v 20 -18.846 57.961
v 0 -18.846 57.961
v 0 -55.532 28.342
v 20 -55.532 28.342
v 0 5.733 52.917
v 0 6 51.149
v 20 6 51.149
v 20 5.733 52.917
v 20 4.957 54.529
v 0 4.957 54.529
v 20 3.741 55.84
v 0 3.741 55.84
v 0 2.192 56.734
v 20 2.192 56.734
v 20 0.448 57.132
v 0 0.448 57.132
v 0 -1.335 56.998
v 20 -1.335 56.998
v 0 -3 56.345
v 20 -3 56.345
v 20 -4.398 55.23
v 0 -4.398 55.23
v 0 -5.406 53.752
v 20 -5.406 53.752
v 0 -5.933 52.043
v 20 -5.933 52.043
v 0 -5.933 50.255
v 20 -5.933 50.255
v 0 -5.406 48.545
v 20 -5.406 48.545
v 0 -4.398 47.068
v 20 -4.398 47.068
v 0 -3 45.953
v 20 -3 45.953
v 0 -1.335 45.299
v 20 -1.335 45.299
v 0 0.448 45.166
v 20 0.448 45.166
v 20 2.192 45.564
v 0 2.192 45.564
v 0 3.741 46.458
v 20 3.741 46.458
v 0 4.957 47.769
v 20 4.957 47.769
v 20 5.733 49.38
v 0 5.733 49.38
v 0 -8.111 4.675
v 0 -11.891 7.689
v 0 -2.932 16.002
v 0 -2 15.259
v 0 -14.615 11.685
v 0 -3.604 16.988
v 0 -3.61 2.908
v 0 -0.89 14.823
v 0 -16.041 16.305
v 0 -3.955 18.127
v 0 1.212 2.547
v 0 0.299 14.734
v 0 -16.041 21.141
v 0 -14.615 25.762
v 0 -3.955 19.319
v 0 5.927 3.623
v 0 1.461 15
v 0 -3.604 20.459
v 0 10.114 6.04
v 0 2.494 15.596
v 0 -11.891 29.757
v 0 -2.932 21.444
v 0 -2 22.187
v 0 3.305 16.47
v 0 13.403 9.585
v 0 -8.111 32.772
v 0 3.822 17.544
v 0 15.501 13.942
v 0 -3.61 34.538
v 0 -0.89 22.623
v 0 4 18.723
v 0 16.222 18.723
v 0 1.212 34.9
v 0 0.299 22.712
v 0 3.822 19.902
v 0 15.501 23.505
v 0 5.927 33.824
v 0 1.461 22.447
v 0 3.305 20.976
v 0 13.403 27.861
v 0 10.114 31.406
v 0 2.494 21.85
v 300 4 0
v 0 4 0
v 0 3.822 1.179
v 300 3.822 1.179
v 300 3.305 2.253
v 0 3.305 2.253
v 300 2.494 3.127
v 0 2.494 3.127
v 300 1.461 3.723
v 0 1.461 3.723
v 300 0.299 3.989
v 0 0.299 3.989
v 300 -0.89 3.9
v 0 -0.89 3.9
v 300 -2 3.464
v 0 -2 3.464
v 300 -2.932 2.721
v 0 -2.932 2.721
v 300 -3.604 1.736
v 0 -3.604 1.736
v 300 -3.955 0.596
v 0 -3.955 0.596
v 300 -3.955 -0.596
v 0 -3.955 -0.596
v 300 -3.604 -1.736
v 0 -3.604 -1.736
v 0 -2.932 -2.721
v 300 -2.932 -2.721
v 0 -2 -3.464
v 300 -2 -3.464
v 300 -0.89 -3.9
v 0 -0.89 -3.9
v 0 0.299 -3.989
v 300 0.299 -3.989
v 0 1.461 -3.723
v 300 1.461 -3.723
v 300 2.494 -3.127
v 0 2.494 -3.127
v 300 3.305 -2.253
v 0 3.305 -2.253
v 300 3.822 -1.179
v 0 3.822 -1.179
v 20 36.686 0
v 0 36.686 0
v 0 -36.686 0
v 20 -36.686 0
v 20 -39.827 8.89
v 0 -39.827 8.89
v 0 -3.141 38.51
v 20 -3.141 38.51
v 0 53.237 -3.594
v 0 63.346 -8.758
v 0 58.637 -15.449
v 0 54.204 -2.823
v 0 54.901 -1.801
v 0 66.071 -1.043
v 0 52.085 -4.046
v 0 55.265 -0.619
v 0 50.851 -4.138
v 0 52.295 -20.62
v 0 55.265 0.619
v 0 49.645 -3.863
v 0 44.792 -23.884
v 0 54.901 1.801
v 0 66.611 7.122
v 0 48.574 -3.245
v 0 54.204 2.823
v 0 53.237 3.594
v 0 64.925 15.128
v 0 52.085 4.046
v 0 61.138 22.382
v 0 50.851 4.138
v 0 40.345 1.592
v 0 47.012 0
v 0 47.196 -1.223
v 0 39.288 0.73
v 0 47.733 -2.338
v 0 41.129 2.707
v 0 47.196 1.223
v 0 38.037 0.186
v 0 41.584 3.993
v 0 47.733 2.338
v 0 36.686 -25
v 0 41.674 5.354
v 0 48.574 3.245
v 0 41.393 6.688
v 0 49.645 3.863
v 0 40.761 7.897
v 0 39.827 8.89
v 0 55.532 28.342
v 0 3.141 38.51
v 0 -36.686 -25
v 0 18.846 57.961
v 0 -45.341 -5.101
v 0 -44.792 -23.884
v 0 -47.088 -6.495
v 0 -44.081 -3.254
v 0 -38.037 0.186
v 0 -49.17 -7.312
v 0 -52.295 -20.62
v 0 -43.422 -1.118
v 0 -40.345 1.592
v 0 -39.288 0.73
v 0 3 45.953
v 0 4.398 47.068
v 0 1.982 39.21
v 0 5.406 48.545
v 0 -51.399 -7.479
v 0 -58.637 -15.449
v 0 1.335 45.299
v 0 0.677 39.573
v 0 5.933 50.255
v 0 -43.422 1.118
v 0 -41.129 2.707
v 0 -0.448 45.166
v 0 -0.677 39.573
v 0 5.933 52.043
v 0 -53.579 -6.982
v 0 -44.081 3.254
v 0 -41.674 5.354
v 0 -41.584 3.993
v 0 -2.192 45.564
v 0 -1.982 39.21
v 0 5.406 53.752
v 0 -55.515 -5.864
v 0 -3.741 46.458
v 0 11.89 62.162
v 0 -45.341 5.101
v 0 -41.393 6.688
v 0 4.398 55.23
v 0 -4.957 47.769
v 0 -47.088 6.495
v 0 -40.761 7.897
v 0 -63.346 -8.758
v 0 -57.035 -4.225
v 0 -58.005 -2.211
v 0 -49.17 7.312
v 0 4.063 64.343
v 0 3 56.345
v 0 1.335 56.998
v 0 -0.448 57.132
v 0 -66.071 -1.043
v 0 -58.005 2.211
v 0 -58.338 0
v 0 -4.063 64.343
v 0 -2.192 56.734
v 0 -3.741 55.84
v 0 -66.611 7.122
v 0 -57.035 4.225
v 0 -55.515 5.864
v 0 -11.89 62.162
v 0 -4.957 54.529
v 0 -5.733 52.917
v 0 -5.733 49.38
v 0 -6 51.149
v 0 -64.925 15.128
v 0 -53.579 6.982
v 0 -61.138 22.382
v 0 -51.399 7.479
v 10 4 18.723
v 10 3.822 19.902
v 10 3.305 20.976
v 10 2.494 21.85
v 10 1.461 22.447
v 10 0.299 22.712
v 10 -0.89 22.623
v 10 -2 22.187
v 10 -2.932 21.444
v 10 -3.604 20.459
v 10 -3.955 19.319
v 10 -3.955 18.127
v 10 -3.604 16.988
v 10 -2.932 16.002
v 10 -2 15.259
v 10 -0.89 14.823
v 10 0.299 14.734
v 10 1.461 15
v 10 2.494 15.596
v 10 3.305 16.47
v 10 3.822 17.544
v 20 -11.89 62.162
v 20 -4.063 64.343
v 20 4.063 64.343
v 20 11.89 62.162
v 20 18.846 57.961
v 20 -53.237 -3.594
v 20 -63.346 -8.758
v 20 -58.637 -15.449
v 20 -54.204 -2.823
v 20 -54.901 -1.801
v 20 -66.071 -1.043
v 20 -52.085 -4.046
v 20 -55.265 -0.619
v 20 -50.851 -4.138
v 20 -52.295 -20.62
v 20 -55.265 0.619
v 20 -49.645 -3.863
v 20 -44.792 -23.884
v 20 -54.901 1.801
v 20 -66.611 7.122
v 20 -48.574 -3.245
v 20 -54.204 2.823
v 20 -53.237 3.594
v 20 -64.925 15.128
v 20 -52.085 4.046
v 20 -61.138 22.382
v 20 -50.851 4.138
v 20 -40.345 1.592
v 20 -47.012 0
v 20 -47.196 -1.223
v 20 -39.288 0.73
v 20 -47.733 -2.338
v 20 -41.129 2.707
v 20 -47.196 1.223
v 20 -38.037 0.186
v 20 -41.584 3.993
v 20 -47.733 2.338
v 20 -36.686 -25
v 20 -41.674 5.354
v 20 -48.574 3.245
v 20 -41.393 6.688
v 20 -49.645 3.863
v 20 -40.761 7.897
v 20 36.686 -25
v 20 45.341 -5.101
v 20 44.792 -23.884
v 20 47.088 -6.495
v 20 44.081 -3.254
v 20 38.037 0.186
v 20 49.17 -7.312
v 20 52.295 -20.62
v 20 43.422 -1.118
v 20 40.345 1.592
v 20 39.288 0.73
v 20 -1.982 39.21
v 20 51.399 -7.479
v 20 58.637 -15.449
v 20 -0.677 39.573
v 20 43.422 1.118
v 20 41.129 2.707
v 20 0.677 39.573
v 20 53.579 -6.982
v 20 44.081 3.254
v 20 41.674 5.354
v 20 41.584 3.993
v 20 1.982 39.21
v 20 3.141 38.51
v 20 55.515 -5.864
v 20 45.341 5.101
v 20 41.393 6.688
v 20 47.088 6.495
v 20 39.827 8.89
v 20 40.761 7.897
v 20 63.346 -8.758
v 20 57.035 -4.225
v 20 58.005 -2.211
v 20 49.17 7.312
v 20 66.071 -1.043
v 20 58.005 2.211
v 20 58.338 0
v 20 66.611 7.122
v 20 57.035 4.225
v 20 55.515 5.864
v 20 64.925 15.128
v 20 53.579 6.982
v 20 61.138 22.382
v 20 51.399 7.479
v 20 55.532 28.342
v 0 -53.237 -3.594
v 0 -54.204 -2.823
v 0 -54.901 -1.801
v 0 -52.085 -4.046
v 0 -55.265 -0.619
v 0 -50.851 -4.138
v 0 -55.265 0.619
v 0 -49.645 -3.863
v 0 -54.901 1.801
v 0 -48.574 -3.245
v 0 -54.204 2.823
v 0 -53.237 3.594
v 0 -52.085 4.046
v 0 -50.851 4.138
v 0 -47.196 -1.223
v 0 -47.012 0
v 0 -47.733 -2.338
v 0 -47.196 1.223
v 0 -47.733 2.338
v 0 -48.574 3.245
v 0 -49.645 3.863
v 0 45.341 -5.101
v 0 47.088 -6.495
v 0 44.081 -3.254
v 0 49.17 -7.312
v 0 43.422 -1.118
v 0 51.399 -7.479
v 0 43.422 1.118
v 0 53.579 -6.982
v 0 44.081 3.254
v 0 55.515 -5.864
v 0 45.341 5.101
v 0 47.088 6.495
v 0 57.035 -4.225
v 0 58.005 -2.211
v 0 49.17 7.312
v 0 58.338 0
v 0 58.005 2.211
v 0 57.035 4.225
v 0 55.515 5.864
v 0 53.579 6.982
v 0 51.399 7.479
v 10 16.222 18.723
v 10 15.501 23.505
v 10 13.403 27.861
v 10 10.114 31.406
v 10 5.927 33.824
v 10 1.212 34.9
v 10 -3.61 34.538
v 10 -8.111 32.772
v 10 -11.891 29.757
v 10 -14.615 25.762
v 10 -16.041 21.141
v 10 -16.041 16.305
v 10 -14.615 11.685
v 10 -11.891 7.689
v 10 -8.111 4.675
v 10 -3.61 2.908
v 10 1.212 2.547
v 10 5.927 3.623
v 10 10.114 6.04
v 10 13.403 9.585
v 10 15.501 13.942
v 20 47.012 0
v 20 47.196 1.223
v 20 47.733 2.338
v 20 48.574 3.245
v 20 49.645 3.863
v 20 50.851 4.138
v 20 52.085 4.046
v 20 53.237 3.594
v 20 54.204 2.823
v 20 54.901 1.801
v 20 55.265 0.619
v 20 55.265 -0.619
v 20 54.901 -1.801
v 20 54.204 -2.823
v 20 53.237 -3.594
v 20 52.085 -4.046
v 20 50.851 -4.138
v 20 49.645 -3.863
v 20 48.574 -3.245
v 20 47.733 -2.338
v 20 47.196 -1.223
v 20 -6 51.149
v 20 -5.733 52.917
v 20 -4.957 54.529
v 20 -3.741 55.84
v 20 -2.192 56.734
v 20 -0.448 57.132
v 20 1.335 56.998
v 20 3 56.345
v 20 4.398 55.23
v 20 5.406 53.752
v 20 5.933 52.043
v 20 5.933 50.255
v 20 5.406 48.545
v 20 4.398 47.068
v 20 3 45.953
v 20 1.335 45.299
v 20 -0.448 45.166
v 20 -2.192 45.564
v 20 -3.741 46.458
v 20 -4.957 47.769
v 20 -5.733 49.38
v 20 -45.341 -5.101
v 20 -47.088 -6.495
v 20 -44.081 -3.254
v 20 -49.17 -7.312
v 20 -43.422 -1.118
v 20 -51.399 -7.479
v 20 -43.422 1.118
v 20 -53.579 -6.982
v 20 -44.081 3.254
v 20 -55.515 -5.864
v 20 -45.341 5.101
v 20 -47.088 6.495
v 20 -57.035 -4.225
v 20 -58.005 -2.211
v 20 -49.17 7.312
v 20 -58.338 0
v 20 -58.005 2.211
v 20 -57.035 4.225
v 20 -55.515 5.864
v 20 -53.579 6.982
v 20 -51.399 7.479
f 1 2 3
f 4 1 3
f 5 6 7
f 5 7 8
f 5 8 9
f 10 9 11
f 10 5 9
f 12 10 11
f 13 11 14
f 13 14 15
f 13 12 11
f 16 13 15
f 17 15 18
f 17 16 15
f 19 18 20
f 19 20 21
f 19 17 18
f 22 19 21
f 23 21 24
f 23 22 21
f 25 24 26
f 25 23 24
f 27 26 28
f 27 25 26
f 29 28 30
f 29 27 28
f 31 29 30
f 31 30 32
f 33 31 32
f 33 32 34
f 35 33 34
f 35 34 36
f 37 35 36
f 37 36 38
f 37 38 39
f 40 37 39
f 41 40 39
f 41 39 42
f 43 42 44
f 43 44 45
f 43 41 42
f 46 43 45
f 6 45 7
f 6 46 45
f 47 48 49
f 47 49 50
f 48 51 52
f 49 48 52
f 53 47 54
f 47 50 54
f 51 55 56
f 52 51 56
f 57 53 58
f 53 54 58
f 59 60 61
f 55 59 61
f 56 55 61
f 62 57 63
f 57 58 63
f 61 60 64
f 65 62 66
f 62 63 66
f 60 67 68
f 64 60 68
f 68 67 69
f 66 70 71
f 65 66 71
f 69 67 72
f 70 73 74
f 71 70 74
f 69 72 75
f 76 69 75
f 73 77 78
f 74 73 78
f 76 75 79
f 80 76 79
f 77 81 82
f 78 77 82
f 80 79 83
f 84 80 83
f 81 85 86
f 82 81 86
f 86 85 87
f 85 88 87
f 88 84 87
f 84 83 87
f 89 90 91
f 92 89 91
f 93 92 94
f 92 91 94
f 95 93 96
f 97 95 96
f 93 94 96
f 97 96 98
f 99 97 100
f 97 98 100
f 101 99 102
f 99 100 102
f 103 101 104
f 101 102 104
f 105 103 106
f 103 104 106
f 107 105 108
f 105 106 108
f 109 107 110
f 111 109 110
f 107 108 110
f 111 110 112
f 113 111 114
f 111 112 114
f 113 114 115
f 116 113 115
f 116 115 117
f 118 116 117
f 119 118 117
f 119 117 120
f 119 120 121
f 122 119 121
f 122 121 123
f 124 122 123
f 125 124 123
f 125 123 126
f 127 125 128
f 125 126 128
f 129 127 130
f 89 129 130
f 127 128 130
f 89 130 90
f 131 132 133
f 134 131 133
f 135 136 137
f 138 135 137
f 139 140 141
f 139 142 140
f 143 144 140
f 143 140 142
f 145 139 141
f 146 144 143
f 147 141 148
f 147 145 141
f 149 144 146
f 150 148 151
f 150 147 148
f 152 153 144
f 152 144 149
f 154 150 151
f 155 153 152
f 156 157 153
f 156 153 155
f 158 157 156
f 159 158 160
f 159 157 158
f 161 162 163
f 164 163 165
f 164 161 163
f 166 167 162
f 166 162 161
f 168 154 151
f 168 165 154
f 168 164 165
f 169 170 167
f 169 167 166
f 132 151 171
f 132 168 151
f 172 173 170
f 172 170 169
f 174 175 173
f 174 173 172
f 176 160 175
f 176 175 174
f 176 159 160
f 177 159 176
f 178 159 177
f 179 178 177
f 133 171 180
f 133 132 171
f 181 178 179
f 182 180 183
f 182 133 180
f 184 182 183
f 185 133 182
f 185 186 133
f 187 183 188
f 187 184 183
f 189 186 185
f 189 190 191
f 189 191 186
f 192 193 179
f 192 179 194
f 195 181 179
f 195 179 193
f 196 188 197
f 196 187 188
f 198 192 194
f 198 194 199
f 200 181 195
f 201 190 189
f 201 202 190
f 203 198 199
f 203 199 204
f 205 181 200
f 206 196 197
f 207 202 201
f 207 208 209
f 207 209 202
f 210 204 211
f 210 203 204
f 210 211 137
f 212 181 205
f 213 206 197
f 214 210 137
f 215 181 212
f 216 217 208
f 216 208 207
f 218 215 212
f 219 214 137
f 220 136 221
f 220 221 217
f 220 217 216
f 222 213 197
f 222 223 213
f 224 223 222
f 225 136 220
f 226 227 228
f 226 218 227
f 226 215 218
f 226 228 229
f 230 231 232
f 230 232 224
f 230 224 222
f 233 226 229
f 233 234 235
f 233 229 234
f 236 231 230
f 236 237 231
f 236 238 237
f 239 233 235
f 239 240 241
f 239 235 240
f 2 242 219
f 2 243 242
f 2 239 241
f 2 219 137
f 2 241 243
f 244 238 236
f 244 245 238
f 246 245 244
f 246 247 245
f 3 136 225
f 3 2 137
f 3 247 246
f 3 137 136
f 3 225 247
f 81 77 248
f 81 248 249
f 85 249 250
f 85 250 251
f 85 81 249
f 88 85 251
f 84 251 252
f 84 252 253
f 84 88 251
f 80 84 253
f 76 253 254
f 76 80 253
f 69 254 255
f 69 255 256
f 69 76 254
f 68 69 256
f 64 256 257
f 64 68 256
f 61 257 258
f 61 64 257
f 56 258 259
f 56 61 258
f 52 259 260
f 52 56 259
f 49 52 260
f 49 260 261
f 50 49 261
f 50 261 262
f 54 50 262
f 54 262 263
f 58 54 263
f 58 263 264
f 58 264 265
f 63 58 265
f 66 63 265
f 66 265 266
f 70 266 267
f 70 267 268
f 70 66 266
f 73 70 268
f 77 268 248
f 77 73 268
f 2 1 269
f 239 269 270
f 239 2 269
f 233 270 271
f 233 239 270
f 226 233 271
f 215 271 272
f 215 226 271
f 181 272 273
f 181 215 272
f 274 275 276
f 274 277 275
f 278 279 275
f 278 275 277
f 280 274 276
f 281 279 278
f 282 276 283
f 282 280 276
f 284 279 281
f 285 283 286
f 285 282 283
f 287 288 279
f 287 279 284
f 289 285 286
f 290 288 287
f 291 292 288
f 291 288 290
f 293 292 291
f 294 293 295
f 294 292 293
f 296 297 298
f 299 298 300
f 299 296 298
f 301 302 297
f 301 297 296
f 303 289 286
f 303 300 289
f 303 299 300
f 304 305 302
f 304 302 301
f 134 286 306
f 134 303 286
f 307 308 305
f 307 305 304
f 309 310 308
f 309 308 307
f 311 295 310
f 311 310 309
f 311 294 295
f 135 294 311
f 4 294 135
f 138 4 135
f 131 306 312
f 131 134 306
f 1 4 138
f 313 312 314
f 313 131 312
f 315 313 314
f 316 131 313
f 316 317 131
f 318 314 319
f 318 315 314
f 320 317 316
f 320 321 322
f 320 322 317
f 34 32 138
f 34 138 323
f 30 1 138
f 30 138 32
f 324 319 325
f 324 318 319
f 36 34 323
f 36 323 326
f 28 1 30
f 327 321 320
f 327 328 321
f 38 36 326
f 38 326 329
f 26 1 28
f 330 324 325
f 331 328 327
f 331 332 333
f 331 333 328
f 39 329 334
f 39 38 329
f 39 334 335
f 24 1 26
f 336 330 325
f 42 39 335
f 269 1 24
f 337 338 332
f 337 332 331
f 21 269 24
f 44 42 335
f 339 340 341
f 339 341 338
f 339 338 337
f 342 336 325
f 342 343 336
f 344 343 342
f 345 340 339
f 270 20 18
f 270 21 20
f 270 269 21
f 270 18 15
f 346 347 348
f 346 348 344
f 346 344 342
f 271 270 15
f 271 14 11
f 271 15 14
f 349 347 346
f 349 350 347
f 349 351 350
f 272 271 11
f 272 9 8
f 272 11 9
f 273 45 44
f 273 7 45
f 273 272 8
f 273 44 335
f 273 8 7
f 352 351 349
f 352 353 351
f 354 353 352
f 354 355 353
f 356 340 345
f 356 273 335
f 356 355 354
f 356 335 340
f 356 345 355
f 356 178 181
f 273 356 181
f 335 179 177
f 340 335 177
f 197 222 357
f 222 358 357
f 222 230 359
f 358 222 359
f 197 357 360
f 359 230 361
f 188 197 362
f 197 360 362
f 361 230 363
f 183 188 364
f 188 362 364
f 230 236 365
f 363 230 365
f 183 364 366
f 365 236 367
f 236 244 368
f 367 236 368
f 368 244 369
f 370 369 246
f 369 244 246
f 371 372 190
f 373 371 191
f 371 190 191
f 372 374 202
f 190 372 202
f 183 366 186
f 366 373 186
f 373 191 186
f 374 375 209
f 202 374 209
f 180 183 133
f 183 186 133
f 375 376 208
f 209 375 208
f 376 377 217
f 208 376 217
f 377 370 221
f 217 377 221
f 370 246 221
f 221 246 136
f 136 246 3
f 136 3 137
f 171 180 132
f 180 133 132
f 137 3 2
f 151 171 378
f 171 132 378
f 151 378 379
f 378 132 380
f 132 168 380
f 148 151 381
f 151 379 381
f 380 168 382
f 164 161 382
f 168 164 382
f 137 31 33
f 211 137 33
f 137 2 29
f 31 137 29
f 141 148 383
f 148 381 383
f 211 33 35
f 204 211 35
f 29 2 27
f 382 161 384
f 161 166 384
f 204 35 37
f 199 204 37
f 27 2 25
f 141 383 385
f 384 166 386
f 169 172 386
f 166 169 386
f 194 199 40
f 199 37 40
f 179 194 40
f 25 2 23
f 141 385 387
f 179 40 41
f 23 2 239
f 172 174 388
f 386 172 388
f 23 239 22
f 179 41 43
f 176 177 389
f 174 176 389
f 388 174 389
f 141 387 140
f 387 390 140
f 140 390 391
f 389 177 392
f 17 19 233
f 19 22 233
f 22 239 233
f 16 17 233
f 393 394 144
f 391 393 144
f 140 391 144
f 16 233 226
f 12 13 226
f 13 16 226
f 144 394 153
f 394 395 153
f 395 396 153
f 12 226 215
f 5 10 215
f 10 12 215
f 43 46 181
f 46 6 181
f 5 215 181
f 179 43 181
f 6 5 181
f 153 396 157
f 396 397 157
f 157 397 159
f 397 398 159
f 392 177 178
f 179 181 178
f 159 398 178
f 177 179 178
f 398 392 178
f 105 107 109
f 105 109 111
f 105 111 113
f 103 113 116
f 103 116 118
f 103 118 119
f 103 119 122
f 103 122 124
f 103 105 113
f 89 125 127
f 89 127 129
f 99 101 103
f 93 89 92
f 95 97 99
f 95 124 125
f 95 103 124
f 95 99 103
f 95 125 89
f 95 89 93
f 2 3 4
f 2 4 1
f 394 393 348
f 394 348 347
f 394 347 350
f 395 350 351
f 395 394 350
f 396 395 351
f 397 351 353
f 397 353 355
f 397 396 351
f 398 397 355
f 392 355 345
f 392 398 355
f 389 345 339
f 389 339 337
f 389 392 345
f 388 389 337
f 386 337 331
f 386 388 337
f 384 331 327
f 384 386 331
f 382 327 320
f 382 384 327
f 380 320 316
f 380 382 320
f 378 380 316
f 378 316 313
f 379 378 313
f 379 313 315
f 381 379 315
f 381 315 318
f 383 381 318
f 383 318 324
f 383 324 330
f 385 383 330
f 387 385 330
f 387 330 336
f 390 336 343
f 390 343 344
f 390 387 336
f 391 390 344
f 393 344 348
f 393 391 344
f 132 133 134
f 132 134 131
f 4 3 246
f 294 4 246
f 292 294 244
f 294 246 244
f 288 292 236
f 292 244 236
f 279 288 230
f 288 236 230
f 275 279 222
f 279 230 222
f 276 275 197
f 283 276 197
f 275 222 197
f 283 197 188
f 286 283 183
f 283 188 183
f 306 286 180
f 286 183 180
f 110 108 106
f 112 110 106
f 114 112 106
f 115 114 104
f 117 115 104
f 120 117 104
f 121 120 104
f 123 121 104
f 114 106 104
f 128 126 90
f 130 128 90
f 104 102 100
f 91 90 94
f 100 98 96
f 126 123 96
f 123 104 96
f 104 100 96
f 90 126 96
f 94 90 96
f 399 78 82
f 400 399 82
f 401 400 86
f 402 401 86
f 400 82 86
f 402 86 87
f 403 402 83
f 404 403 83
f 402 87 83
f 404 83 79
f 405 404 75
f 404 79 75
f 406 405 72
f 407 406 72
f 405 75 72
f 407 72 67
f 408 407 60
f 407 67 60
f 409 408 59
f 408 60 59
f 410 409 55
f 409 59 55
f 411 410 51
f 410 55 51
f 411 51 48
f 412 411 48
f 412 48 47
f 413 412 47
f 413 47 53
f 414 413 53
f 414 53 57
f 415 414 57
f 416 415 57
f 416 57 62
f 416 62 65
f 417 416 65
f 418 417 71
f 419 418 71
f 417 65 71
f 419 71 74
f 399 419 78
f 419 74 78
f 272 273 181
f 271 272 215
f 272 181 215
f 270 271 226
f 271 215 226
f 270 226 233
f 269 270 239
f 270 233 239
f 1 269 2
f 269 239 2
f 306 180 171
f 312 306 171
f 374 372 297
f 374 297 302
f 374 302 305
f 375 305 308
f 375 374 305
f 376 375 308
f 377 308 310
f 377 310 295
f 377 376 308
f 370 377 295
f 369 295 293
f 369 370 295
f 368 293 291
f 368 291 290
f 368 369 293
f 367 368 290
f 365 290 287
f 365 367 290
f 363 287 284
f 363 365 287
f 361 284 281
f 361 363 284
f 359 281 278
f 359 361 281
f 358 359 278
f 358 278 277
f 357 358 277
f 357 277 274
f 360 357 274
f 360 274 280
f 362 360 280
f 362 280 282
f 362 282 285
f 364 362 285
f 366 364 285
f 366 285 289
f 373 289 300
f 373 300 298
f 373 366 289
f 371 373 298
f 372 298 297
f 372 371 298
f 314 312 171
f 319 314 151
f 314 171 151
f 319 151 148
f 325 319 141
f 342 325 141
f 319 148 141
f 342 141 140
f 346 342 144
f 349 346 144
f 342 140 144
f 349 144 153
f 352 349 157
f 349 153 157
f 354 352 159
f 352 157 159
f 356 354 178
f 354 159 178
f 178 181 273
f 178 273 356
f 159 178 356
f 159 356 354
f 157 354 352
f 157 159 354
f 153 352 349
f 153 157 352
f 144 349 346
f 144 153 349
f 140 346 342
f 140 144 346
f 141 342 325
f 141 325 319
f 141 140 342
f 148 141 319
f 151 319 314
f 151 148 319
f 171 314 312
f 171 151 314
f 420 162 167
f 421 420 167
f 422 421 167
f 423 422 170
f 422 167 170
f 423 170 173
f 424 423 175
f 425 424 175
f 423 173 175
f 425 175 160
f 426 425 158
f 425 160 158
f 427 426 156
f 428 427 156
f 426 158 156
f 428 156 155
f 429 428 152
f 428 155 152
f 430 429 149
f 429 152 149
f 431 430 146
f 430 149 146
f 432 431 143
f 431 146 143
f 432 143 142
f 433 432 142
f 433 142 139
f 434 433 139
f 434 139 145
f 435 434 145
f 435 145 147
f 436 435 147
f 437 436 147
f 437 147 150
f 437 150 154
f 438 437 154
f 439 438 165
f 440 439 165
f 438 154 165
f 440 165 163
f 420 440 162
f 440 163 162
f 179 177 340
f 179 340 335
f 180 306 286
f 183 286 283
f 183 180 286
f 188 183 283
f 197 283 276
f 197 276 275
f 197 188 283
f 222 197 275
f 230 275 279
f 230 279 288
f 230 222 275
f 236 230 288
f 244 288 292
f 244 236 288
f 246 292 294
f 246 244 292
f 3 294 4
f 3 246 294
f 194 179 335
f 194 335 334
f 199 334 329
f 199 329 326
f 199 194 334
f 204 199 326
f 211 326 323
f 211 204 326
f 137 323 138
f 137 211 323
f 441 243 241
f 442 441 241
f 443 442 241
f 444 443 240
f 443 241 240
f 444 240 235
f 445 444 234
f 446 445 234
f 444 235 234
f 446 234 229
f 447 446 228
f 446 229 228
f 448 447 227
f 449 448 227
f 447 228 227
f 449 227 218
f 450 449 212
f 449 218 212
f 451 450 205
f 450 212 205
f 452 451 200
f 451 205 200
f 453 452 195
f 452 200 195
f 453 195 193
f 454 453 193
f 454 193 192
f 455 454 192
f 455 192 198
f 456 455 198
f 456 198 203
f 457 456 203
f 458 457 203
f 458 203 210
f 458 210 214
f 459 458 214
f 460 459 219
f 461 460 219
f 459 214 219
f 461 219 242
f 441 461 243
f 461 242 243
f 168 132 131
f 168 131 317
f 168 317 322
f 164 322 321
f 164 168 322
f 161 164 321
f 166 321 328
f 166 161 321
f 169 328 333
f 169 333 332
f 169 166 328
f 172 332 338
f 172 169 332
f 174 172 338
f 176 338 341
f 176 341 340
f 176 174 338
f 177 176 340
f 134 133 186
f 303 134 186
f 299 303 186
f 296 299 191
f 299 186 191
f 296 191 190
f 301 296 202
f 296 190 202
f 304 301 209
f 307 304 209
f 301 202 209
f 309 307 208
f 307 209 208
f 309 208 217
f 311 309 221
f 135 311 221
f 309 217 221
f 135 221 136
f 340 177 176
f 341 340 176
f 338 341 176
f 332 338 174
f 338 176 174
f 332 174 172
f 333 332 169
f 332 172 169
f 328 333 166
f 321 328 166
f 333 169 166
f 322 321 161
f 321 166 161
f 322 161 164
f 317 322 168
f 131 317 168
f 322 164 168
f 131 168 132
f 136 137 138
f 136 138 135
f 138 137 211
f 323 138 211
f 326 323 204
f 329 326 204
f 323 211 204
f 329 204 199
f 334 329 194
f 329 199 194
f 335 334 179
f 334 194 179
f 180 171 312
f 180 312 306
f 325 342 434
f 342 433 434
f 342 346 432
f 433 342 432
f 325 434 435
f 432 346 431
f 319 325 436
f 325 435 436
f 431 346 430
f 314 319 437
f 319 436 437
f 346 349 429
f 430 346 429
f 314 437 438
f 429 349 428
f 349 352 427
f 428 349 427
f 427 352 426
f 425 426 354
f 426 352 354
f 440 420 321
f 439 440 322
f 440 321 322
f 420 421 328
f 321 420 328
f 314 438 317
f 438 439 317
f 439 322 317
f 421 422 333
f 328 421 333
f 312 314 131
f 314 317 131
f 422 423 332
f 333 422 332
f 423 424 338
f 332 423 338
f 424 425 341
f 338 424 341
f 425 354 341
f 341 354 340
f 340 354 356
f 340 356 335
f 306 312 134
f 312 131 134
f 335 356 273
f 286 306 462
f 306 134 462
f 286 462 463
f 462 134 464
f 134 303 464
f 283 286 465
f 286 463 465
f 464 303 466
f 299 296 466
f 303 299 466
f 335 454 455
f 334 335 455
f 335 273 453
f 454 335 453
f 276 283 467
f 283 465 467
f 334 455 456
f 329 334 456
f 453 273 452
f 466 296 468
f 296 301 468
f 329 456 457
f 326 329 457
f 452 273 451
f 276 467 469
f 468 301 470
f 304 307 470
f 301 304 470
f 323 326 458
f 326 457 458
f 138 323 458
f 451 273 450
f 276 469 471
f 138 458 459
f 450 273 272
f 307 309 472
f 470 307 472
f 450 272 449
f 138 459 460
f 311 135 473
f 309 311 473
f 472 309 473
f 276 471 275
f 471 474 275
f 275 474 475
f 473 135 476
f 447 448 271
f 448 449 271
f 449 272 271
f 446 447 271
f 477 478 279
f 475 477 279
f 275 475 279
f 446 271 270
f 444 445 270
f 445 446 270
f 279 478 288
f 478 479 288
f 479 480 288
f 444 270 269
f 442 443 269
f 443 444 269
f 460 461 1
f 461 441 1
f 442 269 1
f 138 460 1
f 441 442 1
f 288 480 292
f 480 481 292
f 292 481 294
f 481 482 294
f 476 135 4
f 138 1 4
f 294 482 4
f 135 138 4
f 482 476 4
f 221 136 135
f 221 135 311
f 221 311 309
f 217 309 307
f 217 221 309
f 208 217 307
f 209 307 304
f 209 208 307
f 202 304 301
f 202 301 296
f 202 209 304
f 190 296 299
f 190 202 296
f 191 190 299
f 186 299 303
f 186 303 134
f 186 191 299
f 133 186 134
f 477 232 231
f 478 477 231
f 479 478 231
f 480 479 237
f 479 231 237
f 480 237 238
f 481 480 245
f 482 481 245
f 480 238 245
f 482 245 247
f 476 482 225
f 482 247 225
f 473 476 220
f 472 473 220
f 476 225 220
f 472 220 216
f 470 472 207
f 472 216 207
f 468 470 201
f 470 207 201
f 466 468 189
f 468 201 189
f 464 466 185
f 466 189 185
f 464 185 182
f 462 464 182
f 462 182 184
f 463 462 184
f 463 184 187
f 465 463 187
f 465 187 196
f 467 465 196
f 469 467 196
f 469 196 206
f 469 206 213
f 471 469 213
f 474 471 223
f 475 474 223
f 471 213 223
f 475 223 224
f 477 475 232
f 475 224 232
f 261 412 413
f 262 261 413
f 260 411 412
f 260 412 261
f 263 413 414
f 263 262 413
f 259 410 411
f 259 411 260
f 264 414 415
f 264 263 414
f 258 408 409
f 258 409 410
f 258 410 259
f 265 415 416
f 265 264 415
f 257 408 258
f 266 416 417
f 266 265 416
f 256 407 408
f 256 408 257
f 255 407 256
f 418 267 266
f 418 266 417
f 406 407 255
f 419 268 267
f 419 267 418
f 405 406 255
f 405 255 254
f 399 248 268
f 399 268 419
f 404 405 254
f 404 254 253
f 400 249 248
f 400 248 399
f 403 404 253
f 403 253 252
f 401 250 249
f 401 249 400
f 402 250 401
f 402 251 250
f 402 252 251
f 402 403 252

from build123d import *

# Parameters (mm, degrees)
F0_R     = 4
F1_DEPTH = 300
F2_R     = 4.15
F2_R_2   = 7.5
F2_R_3   = 6
F3_DEPTH = 20
F5_R     = 16.221886
F5_R_2   = 4
F6_DEPTH = 10


with BuildPart() as f1:
    # F0 (on Right) → F1 (new body)
    with BuildSketch(Plane.YZ):
        Circle(F0_R)
    extrude(amount=F1_DEPTH)


with BuildPart() as f3:
    # F2 (on Right) → F3 (new body)
    with BuildSketch(Plane.YZ):
        with BuildLine():
            Line((0, -25), (36.686111, -25))
            ThreePointArc((36.686111, -25), (64.972656, -4.993565), (55.531673, 28.34191))
            Line((55.531673, 28.34191), (18.845563, 57.961183))
            ThreePointArc((18.845563, 57.961183), (0, 64.619272), (-18.845563, 57.961183))
            Line((-18.845563, 57.961183), (-55.531673, 28.34191))
            ThreePointArc((-55.531673, 28.34191), (-64.972656, -4.993565), (-36.686111, -25))
            Line((-36.686111, -25), (0, -25))
        make_face()
        with Locations((-51.16151, 0)):
            Circle(F2_R, mode=Mode.SUBTRACT)
        with Locations((50.83849, 0)):
            Circle(F2_R_2, mode=Mode.SUBTRACT)
        with BuildLine():
            Line((-39.827038, 8.890318), (-3.140927, 38.509591))
            ThreePointArc((-3.140927, 38.509591), (0, 39.619272), (3.140927, 38.509591))
            Line((3.140927, 38.509591), (39.827038, 8.890318))
            ThreePointArc((39.827038, 8.890318), (41.400535, 3.334406), (36.686111, 0))
            Line((36.686111, 0), (0, 0))
            Line((0, 0), (-36.686111, 0))
            ThreePointArc((-36.686111, 0), (-41.400535, 3.334406), (-39.827038, 8.890318))
        make_face(mode=Mode.SUBTRACT)
        with Locations((0, 51.14878)):
            Circle(F2_R_3, mode=Mode.SUBTRACT)
    extrude(amount=F3_DEPTH)


with BuildPart() as f4_1:
    # F4: instance of F3
    add(f3.part.mirror(Plane.XZ))


with BuildPart() as f6:
    # F5 (on Right) → F6 (new body)
    with BuildSketch(Plane.YZ):
        with Locations((0, 18.723123)):
            Circle(F5_R)
        with Locations((0, 18.723123)):
            Circle(F5_R_2, mode=Mode.SUBTRACT)
    extrude(amount=F6_DEPTH)


solid = Compound([f1.part, f3.part, f4_1.part, f6.part])
